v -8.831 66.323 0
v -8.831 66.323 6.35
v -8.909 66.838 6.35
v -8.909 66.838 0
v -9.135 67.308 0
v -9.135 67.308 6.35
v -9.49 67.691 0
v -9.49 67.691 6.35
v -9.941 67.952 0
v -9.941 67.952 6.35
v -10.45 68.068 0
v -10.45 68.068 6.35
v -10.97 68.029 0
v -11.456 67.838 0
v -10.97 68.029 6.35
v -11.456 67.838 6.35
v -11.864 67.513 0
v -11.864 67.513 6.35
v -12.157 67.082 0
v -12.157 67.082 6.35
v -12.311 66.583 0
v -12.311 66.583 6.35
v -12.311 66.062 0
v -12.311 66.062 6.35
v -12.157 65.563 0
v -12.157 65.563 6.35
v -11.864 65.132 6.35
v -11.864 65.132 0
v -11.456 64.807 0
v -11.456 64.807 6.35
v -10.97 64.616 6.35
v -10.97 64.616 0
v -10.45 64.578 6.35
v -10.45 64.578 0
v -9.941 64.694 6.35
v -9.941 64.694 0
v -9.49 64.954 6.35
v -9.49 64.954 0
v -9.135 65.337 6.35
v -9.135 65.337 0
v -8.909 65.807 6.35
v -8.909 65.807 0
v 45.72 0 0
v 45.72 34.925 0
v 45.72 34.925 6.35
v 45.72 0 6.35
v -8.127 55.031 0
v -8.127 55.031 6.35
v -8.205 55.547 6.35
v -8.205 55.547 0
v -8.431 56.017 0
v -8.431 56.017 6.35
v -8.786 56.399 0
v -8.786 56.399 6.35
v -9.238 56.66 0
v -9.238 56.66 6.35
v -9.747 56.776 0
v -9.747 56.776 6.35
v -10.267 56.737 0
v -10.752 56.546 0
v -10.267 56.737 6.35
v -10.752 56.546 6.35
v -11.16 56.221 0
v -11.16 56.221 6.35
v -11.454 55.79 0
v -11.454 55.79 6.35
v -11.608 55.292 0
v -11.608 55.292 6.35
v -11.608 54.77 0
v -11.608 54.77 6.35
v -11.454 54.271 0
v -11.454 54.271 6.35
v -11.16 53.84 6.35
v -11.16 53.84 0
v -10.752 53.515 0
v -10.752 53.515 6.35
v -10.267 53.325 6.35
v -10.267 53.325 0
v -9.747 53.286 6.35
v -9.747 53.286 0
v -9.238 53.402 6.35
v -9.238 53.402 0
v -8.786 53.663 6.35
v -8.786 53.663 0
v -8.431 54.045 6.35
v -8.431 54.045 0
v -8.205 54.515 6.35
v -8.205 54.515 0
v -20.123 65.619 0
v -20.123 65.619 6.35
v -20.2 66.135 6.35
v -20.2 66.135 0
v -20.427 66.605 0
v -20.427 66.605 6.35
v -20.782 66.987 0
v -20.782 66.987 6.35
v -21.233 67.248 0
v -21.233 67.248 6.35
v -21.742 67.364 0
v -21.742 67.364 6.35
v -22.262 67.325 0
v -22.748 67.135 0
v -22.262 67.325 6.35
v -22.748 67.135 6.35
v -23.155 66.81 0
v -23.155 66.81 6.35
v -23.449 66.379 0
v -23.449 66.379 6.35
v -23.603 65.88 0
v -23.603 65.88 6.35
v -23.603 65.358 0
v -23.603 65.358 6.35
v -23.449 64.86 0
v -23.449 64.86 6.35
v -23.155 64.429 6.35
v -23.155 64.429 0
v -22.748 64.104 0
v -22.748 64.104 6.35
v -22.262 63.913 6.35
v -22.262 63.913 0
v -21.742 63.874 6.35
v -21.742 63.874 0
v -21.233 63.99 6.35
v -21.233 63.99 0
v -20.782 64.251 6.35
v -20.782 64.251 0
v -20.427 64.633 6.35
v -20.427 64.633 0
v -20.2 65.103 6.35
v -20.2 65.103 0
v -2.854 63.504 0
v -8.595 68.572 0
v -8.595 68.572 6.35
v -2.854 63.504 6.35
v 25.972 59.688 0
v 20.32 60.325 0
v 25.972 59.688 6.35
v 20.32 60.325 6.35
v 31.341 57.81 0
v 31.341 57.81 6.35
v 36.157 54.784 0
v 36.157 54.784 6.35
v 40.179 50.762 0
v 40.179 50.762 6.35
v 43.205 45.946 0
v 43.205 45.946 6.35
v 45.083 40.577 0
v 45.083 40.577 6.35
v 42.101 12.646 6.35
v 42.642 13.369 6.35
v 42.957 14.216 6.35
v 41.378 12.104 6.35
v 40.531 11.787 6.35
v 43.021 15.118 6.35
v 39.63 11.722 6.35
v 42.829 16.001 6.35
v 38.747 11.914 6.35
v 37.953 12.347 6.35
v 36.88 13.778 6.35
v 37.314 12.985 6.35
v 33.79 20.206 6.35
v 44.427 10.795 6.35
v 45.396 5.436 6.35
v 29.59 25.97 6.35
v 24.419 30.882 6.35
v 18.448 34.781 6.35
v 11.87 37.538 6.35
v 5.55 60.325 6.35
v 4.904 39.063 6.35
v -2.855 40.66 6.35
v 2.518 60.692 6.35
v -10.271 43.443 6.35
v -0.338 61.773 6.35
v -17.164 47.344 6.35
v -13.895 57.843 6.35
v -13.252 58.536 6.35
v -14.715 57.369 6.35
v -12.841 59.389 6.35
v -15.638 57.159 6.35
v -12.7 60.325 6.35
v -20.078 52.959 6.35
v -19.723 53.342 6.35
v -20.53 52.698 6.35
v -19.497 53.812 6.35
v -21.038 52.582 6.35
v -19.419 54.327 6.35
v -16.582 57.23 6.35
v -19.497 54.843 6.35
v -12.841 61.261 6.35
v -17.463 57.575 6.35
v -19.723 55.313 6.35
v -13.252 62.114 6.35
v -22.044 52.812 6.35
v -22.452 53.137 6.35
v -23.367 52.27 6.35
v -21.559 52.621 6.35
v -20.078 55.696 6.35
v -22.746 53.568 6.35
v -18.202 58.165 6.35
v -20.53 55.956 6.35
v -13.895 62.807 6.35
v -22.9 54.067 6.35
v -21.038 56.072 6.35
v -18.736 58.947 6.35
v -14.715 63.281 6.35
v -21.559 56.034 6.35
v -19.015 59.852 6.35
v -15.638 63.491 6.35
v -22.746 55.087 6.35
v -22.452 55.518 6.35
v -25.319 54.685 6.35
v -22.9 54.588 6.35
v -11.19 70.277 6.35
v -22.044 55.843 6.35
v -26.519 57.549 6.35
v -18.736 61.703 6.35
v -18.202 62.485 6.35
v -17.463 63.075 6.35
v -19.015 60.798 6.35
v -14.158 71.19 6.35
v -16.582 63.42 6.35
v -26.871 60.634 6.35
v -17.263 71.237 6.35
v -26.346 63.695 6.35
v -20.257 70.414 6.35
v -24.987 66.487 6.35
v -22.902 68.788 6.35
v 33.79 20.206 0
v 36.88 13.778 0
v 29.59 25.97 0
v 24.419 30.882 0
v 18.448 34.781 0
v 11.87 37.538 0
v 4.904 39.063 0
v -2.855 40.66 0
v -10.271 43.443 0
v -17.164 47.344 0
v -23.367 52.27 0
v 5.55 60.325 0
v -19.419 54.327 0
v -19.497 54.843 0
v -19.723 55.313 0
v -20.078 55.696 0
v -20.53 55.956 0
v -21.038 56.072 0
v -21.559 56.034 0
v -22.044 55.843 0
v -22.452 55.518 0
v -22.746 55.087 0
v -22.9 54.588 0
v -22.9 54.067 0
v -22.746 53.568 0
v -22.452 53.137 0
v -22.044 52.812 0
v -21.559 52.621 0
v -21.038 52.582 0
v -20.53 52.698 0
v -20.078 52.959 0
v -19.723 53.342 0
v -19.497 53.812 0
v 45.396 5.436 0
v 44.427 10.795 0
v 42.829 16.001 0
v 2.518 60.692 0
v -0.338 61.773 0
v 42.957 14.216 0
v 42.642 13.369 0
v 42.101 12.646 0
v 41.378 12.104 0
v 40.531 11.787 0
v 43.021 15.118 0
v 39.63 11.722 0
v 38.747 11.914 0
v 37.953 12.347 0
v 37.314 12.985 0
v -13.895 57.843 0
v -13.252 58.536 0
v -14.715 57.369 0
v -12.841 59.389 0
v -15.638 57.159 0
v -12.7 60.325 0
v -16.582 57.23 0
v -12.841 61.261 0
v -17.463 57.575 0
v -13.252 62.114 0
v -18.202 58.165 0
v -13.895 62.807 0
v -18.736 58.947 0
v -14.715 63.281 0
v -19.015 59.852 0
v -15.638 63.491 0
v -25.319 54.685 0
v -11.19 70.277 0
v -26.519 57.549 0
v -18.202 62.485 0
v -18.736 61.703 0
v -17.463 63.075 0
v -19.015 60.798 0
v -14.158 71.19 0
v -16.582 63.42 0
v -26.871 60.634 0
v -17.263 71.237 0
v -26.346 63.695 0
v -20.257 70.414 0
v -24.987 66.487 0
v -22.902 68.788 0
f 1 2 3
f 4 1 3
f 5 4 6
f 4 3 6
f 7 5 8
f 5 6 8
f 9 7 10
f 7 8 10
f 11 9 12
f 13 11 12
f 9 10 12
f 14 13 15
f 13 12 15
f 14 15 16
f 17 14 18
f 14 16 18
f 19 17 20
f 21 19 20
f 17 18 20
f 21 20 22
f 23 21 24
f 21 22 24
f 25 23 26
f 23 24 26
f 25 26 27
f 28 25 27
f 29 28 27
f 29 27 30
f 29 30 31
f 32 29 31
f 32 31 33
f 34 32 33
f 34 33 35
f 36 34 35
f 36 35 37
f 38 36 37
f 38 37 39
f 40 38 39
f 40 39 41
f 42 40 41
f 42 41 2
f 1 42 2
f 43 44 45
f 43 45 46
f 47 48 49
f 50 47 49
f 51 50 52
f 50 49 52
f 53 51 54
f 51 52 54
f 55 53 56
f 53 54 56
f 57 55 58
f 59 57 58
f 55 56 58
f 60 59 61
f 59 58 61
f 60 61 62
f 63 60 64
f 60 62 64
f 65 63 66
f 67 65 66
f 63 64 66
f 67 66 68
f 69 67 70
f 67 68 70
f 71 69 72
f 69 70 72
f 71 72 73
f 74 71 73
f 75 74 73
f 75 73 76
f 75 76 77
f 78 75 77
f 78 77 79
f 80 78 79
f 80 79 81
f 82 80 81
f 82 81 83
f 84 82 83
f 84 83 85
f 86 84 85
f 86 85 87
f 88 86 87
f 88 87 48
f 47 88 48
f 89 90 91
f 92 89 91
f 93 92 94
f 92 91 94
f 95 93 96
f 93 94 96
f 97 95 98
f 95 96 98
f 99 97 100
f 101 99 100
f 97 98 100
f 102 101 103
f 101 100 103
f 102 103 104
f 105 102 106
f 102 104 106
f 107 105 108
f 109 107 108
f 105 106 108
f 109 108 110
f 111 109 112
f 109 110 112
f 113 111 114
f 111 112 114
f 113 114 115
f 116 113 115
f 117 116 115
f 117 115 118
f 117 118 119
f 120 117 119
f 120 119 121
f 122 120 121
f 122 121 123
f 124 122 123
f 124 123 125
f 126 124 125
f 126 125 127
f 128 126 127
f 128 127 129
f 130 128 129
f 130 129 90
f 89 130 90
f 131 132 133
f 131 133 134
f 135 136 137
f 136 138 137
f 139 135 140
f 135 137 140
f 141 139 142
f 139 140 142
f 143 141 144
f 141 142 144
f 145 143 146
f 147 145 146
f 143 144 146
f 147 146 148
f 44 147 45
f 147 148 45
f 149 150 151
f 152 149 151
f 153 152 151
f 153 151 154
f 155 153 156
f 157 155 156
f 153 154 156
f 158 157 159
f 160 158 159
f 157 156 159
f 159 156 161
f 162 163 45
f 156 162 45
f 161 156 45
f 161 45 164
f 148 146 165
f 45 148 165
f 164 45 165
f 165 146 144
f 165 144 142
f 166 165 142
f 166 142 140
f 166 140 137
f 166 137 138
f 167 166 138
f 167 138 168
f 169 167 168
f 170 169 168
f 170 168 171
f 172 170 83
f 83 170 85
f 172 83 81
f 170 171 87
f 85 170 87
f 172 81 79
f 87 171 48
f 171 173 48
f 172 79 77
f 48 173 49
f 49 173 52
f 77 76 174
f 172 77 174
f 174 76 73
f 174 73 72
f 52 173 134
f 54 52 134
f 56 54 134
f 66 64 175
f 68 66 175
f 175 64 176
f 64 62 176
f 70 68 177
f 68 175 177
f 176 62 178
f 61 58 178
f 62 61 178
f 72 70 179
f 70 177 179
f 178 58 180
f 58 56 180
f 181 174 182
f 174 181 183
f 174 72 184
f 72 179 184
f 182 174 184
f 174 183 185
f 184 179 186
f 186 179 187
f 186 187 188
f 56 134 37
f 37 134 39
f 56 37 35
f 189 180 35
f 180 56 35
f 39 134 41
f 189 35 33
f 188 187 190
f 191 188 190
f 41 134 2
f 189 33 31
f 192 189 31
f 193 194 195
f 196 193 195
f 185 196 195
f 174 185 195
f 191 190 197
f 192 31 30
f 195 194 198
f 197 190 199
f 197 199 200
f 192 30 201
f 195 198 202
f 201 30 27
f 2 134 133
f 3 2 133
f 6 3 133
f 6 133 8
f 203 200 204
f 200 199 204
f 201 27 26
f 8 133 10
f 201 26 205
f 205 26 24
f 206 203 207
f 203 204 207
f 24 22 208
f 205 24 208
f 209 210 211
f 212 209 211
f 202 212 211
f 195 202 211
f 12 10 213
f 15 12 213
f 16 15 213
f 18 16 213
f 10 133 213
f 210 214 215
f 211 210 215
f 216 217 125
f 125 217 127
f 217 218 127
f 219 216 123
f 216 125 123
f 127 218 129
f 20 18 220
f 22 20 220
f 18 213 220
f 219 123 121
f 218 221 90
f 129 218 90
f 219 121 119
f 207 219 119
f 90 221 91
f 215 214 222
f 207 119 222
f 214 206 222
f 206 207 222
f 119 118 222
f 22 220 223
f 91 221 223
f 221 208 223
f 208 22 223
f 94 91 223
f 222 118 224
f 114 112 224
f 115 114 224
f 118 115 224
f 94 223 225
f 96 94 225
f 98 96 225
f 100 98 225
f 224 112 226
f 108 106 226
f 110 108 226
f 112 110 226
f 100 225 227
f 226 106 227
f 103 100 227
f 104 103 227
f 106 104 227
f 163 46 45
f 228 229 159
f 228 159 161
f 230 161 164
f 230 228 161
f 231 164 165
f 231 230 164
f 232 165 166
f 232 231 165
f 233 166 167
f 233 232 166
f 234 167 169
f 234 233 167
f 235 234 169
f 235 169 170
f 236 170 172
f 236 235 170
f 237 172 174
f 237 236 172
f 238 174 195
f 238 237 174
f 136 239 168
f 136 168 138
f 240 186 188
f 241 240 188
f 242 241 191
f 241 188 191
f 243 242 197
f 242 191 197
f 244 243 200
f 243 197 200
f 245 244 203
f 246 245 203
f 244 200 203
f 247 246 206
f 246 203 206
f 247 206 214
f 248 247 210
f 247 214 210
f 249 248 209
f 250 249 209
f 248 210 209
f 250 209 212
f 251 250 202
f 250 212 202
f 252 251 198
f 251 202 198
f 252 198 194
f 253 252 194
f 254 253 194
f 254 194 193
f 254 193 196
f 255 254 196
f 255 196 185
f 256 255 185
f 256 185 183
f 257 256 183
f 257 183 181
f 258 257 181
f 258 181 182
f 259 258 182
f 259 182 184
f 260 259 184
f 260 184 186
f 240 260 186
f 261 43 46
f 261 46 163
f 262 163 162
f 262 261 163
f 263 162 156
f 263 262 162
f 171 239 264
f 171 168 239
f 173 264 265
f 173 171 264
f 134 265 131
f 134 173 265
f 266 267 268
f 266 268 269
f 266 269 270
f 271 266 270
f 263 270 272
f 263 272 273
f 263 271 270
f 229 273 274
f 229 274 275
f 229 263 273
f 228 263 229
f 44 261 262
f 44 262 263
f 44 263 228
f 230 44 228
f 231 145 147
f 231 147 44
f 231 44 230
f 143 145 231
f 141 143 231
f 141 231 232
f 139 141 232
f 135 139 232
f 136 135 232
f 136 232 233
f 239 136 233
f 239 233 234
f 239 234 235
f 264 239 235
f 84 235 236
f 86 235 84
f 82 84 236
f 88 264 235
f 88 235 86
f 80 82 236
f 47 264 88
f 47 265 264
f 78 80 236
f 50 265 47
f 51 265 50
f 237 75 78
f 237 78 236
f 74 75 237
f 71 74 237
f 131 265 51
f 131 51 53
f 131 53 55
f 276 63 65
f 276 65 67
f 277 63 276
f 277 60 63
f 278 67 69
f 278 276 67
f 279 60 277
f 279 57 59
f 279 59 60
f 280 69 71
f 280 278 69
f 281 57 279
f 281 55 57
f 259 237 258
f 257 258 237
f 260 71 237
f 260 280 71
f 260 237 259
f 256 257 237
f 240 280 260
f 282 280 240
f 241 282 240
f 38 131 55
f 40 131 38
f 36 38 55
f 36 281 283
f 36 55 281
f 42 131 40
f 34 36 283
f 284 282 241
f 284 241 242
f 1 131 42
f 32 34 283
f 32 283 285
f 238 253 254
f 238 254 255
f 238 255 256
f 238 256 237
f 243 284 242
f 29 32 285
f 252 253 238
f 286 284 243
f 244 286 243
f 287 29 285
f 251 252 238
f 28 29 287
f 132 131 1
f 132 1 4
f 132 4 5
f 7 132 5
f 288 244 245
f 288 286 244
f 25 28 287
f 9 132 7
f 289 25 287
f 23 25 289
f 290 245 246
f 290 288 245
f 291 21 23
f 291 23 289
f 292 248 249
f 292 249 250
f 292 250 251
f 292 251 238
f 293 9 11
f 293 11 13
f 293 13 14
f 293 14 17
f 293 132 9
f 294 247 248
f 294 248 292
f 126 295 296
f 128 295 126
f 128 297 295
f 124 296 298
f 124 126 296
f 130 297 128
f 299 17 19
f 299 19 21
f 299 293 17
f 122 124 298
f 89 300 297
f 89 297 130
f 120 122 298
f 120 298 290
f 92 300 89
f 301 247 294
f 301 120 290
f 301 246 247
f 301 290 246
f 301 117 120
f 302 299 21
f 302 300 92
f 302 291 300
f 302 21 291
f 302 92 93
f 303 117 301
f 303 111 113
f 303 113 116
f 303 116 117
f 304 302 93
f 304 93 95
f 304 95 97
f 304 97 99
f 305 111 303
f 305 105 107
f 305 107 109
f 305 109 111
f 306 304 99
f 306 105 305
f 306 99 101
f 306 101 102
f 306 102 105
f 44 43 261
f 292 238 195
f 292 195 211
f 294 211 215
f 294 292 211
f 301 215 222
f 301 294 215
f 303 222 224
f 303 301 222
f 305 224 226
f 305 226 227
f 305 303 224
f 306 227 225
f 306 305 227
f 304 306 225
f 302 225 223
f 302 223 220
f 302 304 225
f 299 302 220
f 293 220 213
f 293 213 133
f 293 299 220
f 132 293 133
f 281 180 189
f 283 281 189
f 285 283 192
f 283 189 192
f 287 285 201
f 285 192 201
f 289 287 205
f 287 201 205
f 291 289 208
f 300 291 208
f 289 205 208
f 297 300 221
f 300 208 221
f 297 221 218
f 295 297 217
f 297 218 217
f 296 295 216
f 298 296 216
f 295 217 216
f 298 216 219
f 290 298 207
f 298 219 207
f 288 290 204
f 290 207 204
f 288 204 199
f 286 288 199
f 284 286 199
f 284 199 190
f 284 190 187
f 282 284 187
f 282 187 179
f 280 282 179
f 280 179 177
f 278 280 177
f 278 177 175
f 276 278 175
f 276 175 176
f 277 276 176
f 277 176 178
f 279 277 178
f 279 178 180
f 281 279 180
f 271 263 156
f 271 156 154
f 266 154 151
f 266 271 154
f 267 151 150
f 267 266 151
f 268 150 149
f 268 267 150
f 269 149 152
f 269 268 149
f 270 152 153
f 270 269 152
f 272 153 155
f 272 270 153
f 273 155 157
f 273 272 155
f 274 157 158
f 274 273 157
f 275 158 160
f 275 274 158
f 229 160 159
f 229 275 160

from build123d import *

# Parameters (mm, degrees)
BOSS_EXTRUDE1_DEPTH = 6.35
SKETCH2_R           = 3.175
SKETCH2_R_2         = 1.75
CUT_EXTRUDE1_DEPTH  = 7.35
BOSS_EXTRUDE2_DEPTH = 6.35
FILLET1_R           = 12.7
FILLET2_R           = 25.4


with BuildPart() as part:
    # Sketch1 → Boss-Extrude1 (new body)
    with BuildSketch(Plane.XY):
        with BuildLine():
            Line((-8.595455009, 68.571709933), (30.25643609, 34.276325287))
            ThreePointArc((30.25643609, 34.276325287), (37.667757847, 25.912514713), (42.82871051, 16.000623615))
            ThreePointArc((42.82871051, 16.000623615), (40.96564892, 11.91525319), (36.880278494, 13.77831478))
            ThreePointArc((36.880278494, 13.77831478), (24.419435892, 30.881840145), (4.903675305, 39.063421106))
            ThreePointArc((4.903675305, 39.063421106), (-10.270602503, 43.44261231), (-23.366607565, 52.270447493))
            ThreePointArc((-23.366607565, 52.270447493), (-24.02632087, 67.711201194), (-8.595455009, 68.571709933))
        make_face()
    extrude(amount=BOSS_EXTRUDE1_DEPTH)

    # Sketch2 → Cut-Extrude1 (cut, through all)
    with BuildSketch(Plane.XY.offset(6.35)):
        with Locations((-15.875, 60.325)):
            Circle(SKETCH2_R)
        with Locations((-10.580785461, 66.322607224)):
            Circle(SKETCH2_R_2)
        with Locations((-9.877392776, 55.030785461)):
            Circle(SKETCH2_R_2)
        with Locations((-21.169214539, 54.327392776)):
            Circle(SKETCH2_R_2)
        with Locations((-21.872607224, 65.619214539)):
            Circle(SKETCH2_R_2)
    extrude(amount=-CUT_EXTRUDE1_DEPTH, mode=Mode.SUBTRACT)

    # Sketch3 → Boss-Extrude2 (add, through all)
    with BuildSketch(Plane(origin=(0, 0, 0), x_dir=(-1, 0, 0), z_dir=(0, 0, -1))):
        with BuildLine():
            Line((-0.746918011, 60.325), (-45.72, 60.325))
            Line((-45.72, 60.325), (-45.72, 0))
            ThreePointArc((-45.72, 0), (-41.67518841, 18.801517784), (-30.25643609, 34.276325287))
            Line((-30.25643609, 34.276325287), (-0.746918011, 60.325))
        make_face()
    extrude(amount=-BOSS_EXTRUDE2_DEPTH)

    # Fillet1
    fillet1_edges = [part.edges().sort_by_distance(p)[0] for p in [
        (0.746918011, 60.325, 3.175),
    ]]
    fillet(fillet1_edges, radius=FILLET1_R)

    # Fillet2
    fillet2_edges = [part.edges().sort_by_distance(p)[0] for p in [
        (45.72, 60.325, 3.175),
    ]]
    fillet(fillet2_edges, radius=FILLET2_R)


solid = part.part
